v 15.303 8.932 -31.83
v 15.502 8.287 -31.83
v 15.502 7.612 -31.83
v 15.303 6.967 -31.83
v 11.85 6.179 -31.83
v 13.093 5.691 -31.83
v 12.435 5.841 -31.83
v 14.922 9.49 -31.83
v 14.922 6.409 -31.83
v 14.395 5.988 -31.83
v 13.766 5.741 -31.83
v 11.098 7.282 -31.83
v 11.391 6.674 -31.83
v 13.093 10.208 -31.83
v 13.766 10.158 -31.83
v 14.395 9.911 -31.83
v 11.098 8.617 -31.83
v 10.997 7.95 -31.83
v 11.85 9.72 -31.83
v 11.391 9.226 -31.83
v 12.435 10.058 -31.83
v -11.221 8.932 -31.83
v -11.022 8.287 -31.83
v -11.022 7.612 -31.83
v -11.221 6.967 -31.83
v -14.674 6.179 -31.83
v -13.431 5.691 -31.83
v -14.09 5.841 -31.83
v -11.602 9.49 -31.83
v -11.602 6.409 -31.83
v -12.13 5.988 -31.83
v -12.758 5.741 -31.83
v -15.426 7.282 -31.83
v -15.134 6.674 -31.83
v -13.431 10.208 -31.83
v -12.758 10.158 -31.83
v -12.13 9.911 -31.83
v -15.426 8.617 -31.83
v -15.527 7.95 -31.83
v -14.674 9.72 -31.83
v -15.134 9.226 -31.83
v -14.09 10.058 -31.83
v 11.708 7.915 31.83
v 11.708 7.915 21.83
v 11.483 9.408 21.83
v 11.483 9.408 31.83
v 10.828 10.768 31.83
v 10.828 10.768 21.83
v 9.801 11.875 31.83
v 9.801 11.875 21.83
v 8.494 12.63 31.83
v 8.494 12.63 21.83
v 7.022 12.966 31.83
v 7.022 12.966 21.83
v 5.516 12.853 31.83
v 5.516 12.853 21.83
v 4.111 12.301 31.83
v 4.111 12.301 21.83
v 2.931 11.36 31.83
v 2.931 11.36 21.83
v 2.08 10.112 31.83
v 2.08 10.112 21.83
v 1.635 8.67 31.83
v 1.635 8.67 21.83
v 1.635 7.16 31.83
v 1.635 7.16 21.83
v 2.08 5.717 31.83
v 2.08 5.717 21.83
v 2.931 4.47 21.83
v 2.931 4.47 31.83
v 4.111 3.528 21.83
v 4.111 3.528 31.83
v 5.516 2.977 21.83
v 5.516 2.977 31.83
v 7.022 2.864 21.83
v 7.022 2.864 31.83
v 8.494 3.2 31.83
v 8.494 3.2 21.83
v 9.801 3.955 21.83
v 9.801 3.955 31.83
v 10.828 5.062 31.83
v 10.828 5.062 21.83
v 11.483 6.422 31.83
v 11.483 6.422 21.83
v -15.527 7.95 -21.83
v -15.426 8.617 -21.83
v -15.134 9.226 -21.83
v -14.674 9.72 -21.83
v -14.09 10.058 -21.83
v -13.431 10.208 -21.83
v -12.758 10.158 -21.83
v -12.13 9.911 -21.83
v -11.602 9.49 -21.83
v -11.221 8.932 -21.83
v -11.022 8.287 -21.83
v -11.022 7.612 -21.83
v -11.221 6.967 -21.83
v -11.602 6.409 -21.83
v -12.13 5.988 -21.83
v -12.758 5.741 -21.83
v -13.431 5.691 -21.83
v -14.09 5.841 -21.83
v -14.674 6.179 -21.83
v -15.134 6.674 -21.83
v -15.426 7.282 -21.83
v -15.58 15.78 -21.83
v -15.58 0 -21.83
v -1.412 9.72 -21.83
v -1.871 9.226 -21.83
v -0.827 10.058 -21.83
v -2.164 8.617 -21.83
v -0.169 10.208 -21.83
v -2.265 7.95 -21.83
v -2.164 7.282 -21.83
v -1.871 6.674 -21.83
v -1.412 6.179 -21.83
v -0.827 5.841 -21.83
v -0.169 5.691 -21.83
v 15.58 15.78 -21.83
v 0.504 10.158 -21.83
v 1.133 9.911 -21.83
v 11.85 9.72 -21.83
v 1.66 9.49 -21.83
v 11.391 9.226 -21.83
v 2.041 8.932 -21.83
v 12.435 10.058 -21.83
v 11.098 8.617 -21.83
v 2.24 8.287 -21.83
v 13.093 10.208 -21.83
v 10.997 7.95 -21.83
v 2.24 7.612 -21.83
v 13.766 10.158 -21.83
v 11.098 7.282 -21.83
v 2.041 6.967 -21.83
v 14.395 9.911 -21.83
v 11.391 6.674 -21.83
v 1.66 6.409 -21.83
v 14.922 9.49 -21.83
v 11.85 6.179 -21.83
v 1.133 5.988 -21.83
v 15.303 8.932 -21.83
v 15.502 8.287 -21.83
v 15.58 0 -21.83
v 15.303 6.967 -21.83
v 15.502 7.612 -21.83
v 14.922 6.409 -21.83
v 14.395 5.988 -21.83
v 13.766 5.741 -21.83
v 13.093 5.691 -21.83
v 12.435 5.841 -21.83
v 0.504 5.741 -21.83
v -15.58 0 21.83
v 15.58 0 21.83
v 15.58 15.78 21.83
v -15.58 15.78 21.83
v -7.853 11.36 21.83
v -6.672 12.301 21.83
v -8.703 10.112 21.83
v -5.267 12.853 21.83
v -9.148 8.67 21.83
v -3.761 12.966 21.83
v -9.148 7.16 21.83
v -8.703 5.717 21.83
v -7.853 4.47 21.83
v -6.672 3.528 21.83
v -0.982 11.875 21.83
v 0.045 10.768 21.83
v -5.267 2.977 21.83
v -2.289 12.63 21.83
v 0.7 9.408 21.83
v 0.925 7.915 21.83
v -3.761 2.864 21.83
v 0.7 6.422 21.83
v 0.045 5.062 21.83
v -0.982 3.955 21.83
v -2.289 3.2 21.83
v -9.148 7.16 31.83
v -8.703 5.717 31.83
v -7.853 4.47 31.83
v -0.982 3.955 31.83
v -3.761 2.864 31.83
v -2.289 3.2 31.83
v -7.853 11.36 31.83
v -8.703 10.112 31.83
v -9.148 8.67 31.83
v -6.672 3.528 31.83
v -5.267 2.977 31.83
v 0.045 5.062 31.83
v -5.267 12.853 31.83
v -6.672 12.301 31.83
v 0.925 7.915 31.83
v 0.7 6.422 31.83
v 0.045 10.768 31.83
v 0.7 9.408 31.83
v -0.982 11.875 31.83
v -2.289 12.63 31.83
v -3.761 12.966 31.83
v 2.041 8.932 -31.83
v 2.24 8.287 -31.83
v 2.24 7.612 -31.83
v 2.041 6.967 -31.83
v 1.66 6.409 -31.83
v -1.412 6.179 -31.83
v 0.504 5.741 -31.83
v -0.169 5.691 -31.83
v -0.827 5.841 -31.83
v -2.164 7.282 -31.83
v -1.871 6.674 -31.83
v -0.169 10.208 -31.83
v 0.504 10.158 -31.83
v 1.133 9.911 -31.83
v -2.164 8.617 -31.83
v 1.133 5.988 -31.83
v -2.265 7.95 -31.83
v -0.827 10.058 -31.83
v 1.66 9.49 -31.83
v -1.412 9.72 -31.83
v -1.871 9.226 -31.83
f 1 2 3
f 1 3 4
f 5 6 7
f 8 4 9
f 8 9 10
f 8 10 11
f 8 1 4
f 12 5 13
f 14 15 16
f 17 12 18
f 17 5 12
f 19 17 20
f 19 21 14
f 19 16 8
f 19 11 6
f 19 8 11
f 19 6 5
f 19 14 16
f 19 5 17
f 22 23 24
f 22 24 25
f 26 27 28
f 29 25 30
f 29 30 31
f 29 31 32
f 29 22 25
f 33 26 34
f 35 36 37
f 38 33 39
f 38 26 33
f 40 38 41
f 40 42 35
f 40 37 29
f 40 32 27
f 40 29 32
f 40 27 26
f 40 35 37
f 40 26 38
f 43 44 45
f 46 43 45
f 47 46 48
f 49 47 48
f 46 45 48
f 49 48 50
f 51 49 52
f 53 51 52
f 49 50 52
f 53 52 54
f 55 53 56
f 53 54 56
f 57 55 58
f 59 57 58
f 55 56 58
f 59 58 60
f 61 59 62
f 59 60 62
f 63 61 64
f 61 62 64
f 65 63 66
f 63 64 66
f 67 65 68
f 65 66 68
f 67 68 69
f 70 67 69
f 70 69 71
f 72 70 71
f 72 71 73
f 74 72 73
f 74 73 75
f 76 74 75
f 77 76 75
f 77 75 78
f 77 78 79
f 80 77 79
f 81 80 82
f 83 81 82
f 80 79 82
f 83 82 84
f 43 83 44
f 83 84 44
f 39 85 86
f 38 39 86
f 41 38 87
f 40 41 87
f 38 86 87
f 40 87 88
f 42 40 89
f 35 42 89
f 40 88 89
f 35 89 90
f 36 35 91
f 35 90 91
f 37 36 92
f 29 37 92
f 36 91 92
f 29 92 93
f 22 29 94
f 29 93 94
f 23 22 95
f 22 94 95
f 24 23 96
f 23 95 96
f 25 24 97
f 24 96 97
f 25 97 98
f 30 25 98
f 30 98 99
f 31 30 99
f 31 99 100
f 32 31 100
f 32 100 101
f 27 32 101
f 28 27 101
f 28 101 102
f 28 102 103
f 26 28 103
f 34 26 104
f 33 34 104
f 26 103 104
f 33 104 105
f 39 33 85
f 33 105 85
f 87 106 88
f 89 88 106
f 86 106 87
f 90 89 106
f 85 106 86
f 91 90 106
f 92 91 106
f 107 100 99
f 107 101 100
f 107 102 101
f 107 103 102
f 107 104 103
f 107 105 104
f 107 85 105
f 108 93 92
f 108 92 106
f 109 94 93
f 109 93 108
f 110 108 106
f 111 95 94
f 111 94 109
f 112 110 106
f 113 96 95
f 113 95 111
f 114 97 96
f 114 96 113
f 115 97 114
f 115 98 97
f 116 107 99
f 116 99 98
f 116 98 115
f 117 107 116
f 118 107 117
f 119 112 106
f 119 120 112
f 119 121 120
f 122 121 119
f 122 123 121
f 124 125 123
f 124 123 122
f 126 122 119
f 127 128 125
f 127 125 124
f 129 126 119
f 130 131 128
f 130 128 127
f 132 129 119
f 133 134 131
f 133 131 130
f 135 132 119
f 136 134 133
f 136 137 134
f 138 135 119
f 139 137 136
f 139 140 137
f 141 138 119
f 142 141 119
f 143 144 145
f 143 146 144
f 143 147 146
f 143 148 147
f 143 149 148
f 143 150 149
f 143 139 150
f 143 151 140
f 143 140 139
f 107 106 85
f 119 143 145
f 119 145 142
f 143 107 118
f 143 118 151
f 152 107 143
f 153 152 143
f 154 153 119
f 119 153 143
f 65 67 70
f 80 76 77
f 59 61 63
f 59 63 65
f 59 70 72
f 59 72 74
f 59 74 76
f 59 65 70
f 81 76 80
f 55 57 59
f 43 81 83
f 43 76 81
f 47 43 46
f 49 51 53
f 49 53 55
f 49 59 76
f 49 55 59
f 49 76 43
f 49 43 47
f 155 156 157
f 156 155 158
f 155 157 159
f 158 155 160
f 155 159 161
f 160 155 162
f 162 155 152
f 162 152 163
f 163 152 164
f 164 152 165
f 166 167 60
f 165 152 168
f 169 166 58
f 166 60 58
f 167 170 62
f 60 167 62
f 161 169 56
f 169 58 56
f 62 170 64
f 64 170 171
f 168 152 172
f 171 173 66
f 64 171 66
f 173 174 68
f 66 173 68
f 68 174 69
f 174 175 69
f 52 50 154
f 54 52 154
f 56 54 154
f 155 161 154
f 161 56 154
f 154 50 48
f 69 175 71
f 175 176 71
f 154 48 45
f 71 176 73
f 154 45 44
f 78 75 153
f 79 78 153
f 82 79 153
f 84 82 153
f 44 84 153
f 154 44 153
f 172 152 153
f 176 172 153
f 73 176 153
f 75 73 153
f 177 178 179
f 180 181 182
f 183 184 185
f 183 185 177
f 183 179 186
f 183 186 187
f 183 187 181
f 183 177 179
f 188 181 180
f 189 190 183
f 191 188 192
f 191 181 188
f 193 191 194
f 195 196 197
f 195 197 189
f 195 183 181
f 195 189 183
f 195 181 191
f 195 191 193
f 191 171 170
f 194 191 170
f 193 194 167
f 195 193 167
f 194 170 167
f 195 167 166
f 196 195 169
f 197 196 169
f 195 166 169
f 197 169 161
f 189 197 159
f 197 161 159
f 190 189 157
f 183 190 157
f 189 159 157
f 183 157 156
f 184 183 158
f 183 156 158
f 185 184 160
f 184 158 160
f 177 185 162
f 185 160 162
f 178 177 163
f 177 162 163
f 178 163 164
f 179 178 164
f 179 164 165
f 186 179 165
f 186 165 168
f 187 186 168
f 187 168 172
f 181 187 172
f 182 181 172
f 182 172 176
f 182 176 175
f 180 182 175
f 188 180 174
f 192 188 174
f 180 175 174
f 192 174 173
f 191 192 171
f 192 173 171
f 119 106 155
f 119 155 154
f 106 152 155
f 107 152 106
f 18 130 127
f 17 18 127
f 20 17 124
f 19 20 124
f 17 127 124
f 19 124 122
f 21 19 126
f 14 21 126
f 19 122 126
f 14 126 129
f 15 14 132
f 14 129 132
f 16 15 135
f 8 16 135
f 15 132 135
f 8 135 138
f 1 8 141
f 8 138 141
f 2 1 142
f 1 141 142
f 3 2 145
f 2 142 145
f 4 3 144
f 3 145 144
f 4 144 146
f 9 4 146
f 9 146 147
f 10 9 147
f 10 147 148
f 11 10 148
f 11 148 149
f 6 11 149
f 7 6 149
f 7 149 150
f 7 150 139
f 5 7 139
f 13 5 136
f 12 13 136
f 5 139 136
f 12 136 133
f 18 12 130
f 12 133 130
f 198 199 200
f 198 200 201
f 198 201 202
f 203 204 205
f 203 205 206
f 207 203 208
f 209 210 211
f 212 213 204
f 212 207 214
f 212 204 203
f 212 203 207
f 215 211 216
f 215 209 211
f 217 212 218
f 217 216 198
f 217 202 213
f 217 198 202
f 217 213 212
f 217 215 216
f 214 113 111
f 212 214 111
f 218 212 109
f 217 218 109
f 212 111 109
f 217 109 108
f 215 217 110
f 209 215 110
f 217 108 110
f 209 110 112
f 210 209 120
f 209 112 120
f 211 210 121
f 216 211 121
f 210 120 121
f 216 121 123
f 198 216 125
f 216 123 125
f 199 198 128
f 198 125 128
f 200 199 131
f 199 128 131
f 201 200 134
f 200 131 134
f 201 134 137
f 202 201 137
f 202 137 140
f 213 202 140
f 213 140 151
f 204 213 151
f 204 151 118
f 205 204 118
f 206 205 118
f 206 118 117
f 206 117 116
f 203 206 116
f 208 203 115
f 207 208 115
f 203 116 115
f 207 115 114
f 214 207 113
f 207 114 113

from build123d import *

# Parameters (mm, degrees)
SKETCH5_W           = 31.16
SKETCH5_H           = 43.66
BOSS_EXTRUDE2_DEPTH = 15.78
BOSS_EXTRUDE3_START = 21.83
SKETCH6_R           = 5.065
BOSS_EXTRUDE3_DEPTH = 10
SKETCH7_R           = 2.265
BOSS_EXTRUDE4_DEPTH = 10


with BuildPart() as part:
    # Sketch5 → Boss-Extrude2 (new body)
    with BuildSketch(Plane(origin=(0, 0, 0), x_dir=(1, 0, 0), z_dir=(0, 1, 0))):
        Rectangle(SKETCH5_W, SKETCH5_H)
    extrude(amount=BOSS_EXTRUDE2_DEPTH)

    # Sketch6 → Boss-Extrude3 (add)
    with BuildSketch(Plane.XY.offset(BOSS_EXTRUDE3_START)):
        with Locations((-4.139755926, 7.914788958)):
            Circle(SKETCH6_R)
        with Locations((6.643440648, 7.914788958)):
            Circle(SKETCH6_R)
    extrude(amount=BOSS_EXTRUDE3_DEPTH)

    # Sketch7 → Boss-Extrude4 (add)
    with BuildSketch(Plane(origin=(0, 0, -21.83), x_dir=(-1, 0, 0), z_dir=(0, 0, -1))):
        with Locations((-13.262092339, 7.949599191)):
            Circle(SKETCH7_R)
        with Locations((0, 7.949599191)):
            Circle(SKETCH7_R)
        with Locations((13.262092339, 7.949599191)):
            Circle(SKETCH7_R)
    extrude(amount=BOSS_EXTRUDE4_DEPTH)


solid = part.part
